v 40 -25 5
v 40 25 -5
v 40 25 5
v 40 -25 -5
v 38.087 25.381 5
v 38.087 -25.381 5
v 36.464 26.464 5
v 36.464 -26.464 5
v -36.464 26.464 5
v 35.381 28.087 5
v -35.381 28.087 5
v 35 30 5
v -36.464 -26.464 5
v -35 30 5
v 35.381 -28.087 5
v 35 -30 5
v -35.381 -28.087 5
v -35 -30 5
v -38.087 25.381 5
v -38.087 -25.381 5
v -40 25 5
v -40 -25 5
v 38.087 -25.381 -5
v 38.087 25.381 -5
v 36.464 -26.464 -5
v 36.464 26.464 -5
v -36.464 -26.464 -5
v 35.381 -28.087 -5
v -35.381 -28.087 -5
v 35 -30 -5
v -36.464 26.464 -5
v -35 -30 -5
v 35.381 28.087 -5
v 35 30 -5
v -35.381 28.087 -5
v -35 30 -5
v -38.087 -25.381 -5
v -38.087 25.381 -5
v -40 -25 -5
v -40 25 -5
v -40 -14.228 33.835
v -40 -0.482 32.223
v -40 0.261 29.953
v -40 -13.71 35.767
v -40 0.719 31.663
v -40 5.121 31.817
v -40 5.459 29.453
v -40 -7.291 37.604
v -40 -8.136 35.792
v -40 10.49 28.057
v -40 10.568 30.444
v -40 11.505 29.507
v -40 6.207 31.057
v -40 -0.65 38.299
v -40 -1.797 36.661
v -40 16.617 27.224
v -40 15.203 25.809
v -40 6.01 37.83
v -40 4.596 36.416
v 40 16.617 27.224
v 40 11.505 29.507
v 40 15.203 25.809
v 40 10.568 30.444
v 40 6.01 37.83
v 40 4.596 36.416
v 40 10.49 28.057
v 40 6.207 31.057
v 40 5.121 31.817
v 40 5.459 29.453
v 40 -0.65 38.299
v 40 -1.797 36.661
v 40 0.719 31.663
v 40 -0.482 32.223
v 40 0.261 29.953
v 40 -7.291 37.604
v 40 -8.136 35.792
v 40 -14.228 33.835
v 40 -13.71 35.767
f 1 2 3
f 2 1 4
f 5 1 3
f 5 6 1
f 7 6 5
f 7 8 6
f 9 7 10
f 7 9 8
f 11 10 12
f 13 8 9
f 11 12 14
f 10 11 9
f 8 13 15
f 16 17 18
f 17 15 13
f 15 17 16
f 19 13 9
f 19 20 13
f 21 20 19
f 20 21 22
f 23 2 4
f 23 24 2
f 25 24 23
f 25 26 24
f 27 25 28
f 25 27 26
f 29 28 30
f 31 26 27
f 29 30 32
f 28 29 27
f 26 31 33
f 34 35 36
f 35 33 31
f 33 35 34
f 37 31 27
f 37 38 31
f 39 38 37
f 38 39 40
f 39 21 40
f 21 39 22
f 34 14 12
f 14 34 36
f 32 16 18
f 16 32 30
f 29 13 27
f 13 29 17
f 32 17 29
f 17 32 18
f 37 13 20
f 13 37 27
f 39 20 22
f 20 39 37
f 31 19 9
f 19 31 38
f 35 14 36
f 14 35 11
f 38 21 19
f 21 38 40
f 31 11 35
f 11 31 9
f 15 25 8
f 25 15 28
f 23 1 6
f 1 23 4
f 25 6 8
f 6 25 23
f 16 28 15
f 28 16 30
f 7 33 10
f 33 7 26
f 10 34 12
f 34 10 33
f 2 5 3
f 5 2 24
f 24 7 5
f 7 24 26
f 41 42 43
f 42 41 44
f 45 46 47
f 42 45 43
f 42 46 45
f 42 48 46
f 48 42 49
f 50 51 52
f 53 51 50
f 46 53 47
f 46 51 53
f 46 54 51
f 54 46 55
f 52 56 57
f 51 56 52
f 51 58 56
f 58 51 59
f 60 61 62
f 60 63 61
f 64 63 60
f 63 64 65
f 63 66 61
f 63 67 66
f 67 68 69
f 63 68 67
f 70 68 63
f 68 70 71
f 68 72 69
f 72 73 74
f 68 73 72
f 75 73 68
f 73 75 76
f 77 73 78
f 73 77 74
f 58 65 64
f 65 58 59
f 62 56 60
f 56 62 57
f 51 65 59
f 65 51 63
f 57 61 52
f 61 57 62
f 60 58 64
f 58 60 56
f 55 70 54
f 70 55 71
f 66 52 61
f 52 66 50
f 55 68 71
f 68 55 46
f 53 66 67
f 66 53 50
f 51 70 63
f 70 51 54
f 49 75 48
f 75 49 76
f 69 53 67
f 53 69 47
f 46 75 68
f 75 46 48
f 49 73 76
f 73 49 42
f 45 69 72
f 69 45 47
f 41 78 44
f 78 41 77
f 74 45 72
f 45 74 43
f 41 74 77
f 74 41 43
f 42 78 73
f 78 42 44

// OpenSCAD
// Variables for dimensions
base_width = 80;
base_depth = 60;
base_height = 10;
holder_height = 15;
holder_angle_min = 45;
holder_angle_max = 75;
cable_slot_width = 10;
cable_slot_height = 5;
rounding_radius = 5;

// Main module
module phone_stand() {
    // Base with rounded corners
    difference() {
        cube([base_width, base_depth, base_height], center = true);
        translate([-base_width/2, -base_depth/2, -base_height/2]) cylinder(r=rounding_radius, h=base_height+1);
        translate([-base_width/2, base_depth/2, -base_height/2]) cylinder(r=rounding_radius, h=base_height+1);
        translate([base_width/2, -base_depth/2, -base_height/2]) cylinder(r=rounding_radius, h=base_height+1);
        translate([base_width/2, base_depth/2, -base_height/2]) cylinder(r=rounding_radius, h=base_height+1);
    }
    
    // Phone holder with adjustable angle
    for (angle = [holder_angle_min:10:holder_angle_max]) {
        rotate([angle, 0, 0]) 
        translate([0, base_depth/2, holder_height]) 
        cube([base_width, 2, holder_height], center = true);
    }
    
    // Slot for cable management
    translate([0, -base_depth/2, -base_height/2]) 
    cube([cable_slot_width, 2, cable_slot_height]);
}

// Call the main module
phone_stand();
